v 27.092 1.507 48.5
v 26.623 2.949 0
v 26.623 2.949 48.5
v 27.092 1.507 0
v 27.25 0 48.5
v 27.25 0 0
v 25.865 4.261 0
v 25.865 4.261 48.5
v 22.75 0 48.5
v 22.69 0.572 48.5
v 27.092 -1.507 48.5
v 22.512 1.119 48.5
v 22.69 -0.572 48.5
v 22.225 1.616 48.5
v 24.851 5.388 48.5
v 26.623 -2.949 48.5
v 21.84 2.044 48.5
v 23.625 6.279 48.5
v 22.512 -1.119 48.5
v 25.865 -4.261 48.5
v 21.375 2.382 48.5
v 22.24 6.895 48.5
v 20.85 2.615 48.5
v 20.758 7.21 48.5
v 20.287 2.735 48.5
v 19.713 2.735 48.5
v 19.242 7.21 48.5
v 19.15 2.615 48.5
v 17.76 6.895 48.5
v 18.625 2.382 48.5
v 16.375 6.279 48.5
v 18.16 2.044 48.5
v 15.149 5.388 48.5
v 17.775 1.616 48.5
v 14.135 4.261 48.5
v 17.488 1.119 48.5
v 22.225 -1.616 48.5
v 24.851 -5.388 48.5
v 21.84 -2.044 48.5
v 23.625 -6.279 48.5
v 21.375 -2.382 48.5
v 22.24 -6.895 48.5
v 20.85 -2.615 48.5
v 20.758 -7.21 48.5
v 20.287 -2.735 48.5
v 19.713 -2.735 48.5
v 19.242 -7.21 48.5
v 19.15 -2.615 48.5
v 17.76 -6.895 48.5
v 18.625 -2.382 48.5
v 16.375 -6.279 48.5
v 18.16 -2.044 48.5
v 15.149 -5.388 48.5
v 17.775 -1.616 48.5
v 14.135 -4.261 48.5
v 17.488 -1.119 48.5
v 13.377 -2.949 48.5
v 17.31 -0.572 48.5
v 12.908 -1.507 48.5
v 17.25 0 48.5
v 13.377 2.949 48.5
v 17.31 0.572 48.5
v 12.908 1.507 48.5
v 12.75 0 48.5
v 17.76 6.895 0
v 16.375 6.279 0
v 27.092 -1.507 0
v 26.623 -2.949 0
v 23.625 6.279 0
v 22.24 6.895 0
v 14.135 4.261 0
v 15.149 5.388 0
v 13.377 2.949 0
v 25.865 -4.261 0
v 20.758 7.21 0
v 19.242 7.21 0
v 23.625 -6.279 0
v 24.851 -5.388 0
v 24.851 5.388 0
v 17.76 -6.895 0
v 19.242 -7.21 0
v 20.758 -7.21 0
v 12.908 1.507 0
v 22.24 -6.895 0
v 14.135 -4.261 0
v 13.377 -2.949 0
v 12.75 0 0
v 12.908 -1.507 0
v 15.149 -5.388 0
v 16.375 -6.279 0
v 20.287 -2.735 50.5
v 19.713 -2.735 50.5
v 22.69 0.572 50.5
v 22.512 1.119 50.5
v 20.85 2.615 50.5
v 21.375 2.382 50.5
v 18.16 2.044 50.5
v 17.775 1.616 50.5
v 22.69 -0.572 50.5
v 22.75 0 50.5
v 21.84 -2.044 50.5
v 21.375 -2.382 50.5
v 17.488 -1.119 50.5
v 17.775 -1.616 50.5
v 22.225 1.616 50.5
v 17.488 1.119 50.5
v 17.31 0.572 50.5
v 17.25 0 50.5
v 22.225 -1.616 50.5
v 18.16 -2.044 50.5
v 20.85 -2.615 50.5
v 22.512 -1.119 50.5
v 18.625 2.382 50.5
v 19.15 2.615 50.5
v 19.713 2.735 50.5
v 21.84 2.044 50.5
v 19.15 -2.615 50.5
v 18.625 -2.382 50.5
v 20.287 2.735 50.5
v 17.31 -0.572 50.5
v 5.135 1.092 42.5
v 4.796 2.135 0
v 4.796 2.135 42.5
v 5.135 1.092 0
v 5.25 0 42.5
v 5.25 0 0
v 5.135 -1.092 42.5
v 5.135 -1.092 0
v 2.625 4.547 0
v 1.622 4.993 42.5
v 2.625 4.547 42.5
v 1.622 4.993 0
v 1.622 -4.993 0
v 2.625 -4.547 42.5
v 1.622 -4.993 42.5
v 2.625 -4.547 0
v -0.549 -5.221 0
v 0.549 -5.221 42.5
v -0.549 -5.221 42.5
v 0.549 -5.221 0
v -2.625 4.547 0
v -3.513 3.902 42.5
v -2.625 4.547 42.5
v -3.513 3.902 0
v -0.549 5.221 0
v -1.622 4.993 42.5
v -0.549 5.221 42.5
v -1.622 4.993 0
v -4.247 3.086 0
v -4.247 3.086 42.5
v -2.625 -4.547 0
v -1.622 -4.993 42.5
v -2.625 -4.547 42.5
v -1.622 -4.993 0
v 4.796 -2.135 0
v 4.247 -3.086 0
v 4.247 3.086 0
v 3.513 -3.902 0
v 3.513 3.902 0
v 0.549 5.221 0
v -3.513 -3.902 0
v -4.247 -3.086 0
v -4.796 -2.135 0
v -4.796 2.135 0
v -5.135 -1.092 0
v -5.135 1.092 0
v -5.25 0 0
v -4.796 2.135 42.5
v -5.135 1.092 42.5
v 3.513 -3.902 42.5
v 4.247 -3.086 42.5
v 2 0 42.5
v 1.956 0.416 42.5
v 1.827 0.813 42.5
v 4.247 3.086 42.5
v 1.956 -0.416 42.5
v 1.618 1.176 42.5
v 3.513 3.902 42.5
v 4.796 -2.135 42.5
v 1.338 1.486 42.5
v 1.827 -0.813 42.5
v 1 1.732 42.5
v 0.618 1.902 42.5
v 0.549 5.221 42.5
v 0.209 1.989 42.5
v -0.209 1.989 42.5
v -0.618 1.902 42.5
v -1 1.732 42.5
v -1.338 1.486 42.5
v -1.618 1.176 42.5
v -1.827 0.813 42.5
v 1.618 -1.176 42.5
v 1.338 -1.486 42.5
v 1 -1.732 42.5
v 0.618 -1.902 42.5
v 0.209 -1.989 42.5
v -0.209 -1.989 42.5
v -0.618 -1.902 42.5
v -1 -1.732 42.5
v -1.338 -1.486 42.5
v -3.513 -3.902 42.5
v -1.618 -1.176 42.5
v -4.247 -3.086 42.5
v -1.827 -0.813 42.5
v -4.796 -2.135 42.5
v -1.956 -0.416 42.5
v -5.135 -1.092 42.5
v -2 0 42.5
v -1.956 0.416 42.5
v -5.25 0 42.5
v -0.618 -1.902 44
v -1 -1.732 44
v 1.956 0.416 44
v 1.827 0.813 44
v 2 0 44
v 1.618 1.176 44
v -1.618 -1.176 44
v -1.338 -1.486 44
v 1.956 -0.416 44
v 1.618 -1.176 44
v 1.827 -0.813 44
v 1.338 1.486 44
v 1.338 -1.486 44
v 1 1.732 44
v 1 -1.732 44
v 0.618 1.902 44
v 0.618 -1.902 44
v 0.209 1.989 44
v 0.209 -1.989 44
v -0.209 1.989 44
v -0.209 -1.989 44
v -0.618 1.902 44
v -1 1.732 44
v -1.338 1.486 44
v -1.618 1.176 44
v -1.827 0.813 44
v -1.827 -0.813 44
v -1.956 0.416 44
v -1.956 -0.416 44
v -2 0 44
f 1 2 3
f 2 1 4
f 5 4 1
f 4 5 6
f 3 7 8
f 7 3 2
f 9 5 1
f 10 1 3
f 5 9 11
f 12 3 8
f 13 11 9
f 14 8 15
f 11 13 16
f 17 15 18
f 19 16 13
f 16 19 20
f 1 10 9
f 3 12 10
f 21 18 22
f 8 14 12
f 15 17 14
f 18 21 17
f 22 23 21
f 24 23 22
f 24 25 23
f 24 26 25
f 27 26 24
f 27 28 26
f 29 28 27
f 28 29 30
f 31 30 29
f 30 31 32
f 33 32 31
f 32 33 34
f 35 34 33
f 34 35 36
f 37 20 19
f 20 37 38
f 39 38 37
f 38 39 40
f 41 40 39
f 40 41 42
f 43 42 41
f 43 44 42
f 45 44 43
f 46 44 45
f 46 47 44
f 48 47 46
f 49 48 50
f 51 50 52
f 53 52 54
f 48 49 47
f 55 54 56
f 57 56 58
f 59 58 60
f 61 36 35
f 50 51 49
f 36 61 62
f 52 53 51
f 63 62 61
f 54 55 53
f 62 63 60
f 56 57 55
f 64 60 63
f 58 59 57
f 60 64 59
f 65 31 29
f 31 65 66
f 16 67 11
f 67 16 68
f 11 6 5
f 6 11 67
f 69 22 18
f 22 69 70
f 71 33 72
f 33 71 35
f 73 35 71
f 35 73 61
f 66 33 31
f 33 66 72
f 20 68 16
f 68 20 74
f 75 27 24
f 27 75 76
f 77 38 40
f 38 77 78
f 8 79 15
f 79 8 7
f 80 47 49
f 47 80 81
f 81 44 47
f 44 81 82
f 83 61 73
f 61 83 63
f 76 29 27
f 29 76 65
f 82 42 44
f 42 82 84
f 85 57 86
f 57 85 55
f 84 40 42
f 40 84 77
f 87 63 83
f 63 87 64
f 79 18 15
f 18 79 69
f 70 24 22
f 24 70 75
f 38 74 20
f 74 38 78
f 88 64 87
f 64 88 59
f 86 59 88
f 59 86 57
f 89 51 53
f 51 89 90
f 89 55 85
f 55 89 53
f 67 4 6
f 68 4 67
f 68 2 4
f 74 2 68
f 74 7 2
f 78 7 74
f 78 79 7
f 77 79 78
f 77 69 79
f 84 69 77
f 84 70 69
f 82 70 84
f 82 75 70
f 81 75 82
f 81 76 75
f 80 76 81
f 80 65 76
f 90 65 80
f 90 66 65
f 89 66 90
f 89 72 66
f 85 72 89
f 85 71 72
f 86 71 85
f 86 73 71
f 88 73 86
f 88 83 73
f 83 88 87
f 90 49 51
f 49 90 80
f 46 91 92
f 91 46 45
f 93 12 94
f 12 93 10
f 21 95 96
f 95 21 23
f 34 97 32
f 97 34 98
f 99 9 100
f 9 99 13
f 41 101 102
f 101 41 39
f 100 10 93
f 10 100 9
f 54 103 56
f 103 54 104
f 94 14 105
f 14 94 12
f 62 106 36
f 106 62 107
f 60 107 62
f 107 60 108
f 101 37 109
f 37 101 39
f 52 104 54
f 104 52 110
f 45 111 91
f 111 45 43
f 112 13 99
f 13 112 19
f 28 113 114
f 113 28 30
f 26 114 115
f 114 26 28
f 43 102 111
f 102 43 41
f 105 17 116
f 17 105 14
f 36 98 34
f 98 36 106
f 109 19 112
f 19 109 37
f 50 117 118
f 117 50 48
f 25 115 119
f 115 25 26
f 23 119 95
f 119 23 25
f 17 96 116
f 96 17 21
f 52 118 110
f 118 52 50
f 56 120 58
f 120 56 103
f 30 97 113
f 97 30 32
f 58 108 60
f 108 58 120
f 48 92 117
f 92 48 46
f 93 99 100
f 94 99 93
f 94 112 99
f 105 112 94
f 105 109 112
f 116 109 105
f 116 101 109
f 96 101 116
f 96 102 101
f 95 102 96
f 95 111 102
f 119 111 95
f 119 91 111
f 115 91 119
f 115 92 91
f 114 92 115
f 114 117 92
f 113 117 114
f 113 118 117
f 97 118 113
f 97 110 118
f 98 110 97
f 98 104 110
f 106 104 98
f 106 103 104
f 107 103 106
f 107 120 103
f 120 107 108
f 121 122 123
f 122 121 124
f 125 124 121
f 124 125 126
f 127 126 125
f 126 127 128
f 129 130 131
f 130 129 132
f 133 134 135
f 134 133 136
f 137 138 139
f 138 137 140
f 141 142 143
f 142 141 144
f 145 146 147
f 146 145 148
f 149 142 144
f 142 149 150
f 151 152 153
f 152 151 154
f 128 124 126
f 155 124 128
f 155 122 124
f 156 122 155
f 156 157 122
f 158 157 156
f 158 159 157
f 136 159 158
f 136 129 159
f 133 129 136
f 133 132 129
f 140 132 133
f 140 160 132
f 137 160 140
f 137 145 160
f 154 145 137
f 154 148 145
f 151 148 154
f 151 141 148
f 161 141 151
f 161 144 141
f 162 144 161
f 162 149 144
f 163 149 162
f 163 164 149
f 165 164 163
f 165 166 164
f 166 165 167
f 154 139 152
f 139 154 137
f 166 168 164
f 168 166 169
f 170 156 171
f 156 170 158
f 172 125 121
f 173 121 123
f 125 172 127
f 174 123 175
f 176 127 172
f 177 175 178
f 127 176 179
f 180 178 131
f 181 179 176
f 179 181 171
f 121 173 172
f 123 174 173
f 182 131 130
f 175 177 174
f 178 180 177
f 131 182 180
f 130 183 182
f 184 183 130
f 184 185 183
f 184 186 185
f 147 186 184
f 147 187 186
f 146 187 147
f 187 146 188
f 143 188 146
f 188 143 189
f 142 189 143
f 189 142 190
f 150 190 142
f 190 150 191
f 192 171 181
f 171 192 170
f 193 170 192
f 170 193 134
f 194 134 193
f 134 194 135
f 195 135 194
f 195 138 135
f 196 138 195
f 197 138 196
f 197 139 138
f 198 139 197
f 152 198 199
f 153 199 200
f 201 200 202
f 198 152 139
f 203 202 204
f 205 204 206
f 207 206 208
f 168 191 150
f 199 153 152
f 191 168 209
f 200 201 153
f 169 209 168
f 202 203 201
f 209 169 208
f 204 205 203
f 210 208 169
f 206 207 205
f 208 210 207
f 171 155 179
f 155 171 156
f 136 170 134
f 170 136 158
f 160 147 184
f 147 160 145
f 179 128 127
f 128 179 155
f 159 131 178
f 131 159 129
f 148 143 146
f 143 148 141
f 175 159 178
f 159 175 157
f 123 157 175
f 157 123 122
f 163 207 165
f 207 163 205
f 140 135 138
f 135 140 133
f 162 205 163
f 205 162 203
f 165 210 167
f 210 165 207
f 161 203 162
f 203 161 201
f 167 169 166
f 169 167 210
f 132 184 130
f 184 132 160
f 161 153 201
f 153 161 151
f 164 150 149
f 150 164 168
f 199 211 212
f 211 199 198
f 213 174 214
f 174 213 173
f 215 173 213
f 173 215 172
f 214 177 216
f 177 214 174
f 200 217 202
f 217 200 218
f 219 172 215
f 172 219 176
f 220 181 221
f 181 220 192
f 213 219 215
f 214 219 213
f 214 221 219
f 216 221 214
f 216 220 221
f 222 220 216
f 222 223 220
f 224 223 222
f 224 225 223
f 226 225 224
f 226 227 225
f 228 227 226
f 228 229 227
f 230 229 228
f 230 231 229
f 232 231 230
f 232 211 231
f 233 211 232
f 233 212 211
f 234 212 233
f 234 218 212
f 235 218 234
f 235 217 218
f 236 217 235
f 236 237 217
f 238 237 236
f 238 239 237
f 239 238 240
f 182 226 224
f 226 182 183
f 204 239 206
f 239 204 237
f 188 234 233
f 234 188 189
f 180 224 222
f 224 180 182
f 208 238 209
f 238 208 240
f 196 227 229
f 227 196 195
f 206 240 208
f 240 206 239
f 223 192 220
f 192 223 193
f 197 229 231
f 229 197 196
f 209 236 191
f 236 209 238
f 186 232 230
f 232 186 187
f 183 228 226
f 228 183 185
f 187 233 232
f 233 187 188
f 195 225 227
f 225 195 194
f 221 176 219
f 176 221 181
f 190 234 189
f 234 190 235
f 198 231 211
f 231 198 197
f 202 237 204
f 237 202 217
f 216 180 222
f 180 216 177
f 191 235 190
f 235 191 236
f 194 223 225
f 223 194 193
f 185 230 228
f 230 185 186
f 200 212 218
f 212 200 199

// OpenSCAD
module batteryAA()
{
  cylinder(h=48.5, r=14.5/2, $fs=0.1);
  translate([0,0, 48.5])
    cylinder(h=2, r=5.5/2, $fs=0.1);
}

module batteryAAA()
{
  cylinder(h=42.5, r=10.5/2, $fs=0.1);
  translate([0,0, 42.5])
    cylinder(h=1.5, r=4/2, $fs=0.1);
}

// just an exhibition - not used directly
translate([20,0,0])
  batteryAA();
translate([0,0,0])
  batteryAAA();
